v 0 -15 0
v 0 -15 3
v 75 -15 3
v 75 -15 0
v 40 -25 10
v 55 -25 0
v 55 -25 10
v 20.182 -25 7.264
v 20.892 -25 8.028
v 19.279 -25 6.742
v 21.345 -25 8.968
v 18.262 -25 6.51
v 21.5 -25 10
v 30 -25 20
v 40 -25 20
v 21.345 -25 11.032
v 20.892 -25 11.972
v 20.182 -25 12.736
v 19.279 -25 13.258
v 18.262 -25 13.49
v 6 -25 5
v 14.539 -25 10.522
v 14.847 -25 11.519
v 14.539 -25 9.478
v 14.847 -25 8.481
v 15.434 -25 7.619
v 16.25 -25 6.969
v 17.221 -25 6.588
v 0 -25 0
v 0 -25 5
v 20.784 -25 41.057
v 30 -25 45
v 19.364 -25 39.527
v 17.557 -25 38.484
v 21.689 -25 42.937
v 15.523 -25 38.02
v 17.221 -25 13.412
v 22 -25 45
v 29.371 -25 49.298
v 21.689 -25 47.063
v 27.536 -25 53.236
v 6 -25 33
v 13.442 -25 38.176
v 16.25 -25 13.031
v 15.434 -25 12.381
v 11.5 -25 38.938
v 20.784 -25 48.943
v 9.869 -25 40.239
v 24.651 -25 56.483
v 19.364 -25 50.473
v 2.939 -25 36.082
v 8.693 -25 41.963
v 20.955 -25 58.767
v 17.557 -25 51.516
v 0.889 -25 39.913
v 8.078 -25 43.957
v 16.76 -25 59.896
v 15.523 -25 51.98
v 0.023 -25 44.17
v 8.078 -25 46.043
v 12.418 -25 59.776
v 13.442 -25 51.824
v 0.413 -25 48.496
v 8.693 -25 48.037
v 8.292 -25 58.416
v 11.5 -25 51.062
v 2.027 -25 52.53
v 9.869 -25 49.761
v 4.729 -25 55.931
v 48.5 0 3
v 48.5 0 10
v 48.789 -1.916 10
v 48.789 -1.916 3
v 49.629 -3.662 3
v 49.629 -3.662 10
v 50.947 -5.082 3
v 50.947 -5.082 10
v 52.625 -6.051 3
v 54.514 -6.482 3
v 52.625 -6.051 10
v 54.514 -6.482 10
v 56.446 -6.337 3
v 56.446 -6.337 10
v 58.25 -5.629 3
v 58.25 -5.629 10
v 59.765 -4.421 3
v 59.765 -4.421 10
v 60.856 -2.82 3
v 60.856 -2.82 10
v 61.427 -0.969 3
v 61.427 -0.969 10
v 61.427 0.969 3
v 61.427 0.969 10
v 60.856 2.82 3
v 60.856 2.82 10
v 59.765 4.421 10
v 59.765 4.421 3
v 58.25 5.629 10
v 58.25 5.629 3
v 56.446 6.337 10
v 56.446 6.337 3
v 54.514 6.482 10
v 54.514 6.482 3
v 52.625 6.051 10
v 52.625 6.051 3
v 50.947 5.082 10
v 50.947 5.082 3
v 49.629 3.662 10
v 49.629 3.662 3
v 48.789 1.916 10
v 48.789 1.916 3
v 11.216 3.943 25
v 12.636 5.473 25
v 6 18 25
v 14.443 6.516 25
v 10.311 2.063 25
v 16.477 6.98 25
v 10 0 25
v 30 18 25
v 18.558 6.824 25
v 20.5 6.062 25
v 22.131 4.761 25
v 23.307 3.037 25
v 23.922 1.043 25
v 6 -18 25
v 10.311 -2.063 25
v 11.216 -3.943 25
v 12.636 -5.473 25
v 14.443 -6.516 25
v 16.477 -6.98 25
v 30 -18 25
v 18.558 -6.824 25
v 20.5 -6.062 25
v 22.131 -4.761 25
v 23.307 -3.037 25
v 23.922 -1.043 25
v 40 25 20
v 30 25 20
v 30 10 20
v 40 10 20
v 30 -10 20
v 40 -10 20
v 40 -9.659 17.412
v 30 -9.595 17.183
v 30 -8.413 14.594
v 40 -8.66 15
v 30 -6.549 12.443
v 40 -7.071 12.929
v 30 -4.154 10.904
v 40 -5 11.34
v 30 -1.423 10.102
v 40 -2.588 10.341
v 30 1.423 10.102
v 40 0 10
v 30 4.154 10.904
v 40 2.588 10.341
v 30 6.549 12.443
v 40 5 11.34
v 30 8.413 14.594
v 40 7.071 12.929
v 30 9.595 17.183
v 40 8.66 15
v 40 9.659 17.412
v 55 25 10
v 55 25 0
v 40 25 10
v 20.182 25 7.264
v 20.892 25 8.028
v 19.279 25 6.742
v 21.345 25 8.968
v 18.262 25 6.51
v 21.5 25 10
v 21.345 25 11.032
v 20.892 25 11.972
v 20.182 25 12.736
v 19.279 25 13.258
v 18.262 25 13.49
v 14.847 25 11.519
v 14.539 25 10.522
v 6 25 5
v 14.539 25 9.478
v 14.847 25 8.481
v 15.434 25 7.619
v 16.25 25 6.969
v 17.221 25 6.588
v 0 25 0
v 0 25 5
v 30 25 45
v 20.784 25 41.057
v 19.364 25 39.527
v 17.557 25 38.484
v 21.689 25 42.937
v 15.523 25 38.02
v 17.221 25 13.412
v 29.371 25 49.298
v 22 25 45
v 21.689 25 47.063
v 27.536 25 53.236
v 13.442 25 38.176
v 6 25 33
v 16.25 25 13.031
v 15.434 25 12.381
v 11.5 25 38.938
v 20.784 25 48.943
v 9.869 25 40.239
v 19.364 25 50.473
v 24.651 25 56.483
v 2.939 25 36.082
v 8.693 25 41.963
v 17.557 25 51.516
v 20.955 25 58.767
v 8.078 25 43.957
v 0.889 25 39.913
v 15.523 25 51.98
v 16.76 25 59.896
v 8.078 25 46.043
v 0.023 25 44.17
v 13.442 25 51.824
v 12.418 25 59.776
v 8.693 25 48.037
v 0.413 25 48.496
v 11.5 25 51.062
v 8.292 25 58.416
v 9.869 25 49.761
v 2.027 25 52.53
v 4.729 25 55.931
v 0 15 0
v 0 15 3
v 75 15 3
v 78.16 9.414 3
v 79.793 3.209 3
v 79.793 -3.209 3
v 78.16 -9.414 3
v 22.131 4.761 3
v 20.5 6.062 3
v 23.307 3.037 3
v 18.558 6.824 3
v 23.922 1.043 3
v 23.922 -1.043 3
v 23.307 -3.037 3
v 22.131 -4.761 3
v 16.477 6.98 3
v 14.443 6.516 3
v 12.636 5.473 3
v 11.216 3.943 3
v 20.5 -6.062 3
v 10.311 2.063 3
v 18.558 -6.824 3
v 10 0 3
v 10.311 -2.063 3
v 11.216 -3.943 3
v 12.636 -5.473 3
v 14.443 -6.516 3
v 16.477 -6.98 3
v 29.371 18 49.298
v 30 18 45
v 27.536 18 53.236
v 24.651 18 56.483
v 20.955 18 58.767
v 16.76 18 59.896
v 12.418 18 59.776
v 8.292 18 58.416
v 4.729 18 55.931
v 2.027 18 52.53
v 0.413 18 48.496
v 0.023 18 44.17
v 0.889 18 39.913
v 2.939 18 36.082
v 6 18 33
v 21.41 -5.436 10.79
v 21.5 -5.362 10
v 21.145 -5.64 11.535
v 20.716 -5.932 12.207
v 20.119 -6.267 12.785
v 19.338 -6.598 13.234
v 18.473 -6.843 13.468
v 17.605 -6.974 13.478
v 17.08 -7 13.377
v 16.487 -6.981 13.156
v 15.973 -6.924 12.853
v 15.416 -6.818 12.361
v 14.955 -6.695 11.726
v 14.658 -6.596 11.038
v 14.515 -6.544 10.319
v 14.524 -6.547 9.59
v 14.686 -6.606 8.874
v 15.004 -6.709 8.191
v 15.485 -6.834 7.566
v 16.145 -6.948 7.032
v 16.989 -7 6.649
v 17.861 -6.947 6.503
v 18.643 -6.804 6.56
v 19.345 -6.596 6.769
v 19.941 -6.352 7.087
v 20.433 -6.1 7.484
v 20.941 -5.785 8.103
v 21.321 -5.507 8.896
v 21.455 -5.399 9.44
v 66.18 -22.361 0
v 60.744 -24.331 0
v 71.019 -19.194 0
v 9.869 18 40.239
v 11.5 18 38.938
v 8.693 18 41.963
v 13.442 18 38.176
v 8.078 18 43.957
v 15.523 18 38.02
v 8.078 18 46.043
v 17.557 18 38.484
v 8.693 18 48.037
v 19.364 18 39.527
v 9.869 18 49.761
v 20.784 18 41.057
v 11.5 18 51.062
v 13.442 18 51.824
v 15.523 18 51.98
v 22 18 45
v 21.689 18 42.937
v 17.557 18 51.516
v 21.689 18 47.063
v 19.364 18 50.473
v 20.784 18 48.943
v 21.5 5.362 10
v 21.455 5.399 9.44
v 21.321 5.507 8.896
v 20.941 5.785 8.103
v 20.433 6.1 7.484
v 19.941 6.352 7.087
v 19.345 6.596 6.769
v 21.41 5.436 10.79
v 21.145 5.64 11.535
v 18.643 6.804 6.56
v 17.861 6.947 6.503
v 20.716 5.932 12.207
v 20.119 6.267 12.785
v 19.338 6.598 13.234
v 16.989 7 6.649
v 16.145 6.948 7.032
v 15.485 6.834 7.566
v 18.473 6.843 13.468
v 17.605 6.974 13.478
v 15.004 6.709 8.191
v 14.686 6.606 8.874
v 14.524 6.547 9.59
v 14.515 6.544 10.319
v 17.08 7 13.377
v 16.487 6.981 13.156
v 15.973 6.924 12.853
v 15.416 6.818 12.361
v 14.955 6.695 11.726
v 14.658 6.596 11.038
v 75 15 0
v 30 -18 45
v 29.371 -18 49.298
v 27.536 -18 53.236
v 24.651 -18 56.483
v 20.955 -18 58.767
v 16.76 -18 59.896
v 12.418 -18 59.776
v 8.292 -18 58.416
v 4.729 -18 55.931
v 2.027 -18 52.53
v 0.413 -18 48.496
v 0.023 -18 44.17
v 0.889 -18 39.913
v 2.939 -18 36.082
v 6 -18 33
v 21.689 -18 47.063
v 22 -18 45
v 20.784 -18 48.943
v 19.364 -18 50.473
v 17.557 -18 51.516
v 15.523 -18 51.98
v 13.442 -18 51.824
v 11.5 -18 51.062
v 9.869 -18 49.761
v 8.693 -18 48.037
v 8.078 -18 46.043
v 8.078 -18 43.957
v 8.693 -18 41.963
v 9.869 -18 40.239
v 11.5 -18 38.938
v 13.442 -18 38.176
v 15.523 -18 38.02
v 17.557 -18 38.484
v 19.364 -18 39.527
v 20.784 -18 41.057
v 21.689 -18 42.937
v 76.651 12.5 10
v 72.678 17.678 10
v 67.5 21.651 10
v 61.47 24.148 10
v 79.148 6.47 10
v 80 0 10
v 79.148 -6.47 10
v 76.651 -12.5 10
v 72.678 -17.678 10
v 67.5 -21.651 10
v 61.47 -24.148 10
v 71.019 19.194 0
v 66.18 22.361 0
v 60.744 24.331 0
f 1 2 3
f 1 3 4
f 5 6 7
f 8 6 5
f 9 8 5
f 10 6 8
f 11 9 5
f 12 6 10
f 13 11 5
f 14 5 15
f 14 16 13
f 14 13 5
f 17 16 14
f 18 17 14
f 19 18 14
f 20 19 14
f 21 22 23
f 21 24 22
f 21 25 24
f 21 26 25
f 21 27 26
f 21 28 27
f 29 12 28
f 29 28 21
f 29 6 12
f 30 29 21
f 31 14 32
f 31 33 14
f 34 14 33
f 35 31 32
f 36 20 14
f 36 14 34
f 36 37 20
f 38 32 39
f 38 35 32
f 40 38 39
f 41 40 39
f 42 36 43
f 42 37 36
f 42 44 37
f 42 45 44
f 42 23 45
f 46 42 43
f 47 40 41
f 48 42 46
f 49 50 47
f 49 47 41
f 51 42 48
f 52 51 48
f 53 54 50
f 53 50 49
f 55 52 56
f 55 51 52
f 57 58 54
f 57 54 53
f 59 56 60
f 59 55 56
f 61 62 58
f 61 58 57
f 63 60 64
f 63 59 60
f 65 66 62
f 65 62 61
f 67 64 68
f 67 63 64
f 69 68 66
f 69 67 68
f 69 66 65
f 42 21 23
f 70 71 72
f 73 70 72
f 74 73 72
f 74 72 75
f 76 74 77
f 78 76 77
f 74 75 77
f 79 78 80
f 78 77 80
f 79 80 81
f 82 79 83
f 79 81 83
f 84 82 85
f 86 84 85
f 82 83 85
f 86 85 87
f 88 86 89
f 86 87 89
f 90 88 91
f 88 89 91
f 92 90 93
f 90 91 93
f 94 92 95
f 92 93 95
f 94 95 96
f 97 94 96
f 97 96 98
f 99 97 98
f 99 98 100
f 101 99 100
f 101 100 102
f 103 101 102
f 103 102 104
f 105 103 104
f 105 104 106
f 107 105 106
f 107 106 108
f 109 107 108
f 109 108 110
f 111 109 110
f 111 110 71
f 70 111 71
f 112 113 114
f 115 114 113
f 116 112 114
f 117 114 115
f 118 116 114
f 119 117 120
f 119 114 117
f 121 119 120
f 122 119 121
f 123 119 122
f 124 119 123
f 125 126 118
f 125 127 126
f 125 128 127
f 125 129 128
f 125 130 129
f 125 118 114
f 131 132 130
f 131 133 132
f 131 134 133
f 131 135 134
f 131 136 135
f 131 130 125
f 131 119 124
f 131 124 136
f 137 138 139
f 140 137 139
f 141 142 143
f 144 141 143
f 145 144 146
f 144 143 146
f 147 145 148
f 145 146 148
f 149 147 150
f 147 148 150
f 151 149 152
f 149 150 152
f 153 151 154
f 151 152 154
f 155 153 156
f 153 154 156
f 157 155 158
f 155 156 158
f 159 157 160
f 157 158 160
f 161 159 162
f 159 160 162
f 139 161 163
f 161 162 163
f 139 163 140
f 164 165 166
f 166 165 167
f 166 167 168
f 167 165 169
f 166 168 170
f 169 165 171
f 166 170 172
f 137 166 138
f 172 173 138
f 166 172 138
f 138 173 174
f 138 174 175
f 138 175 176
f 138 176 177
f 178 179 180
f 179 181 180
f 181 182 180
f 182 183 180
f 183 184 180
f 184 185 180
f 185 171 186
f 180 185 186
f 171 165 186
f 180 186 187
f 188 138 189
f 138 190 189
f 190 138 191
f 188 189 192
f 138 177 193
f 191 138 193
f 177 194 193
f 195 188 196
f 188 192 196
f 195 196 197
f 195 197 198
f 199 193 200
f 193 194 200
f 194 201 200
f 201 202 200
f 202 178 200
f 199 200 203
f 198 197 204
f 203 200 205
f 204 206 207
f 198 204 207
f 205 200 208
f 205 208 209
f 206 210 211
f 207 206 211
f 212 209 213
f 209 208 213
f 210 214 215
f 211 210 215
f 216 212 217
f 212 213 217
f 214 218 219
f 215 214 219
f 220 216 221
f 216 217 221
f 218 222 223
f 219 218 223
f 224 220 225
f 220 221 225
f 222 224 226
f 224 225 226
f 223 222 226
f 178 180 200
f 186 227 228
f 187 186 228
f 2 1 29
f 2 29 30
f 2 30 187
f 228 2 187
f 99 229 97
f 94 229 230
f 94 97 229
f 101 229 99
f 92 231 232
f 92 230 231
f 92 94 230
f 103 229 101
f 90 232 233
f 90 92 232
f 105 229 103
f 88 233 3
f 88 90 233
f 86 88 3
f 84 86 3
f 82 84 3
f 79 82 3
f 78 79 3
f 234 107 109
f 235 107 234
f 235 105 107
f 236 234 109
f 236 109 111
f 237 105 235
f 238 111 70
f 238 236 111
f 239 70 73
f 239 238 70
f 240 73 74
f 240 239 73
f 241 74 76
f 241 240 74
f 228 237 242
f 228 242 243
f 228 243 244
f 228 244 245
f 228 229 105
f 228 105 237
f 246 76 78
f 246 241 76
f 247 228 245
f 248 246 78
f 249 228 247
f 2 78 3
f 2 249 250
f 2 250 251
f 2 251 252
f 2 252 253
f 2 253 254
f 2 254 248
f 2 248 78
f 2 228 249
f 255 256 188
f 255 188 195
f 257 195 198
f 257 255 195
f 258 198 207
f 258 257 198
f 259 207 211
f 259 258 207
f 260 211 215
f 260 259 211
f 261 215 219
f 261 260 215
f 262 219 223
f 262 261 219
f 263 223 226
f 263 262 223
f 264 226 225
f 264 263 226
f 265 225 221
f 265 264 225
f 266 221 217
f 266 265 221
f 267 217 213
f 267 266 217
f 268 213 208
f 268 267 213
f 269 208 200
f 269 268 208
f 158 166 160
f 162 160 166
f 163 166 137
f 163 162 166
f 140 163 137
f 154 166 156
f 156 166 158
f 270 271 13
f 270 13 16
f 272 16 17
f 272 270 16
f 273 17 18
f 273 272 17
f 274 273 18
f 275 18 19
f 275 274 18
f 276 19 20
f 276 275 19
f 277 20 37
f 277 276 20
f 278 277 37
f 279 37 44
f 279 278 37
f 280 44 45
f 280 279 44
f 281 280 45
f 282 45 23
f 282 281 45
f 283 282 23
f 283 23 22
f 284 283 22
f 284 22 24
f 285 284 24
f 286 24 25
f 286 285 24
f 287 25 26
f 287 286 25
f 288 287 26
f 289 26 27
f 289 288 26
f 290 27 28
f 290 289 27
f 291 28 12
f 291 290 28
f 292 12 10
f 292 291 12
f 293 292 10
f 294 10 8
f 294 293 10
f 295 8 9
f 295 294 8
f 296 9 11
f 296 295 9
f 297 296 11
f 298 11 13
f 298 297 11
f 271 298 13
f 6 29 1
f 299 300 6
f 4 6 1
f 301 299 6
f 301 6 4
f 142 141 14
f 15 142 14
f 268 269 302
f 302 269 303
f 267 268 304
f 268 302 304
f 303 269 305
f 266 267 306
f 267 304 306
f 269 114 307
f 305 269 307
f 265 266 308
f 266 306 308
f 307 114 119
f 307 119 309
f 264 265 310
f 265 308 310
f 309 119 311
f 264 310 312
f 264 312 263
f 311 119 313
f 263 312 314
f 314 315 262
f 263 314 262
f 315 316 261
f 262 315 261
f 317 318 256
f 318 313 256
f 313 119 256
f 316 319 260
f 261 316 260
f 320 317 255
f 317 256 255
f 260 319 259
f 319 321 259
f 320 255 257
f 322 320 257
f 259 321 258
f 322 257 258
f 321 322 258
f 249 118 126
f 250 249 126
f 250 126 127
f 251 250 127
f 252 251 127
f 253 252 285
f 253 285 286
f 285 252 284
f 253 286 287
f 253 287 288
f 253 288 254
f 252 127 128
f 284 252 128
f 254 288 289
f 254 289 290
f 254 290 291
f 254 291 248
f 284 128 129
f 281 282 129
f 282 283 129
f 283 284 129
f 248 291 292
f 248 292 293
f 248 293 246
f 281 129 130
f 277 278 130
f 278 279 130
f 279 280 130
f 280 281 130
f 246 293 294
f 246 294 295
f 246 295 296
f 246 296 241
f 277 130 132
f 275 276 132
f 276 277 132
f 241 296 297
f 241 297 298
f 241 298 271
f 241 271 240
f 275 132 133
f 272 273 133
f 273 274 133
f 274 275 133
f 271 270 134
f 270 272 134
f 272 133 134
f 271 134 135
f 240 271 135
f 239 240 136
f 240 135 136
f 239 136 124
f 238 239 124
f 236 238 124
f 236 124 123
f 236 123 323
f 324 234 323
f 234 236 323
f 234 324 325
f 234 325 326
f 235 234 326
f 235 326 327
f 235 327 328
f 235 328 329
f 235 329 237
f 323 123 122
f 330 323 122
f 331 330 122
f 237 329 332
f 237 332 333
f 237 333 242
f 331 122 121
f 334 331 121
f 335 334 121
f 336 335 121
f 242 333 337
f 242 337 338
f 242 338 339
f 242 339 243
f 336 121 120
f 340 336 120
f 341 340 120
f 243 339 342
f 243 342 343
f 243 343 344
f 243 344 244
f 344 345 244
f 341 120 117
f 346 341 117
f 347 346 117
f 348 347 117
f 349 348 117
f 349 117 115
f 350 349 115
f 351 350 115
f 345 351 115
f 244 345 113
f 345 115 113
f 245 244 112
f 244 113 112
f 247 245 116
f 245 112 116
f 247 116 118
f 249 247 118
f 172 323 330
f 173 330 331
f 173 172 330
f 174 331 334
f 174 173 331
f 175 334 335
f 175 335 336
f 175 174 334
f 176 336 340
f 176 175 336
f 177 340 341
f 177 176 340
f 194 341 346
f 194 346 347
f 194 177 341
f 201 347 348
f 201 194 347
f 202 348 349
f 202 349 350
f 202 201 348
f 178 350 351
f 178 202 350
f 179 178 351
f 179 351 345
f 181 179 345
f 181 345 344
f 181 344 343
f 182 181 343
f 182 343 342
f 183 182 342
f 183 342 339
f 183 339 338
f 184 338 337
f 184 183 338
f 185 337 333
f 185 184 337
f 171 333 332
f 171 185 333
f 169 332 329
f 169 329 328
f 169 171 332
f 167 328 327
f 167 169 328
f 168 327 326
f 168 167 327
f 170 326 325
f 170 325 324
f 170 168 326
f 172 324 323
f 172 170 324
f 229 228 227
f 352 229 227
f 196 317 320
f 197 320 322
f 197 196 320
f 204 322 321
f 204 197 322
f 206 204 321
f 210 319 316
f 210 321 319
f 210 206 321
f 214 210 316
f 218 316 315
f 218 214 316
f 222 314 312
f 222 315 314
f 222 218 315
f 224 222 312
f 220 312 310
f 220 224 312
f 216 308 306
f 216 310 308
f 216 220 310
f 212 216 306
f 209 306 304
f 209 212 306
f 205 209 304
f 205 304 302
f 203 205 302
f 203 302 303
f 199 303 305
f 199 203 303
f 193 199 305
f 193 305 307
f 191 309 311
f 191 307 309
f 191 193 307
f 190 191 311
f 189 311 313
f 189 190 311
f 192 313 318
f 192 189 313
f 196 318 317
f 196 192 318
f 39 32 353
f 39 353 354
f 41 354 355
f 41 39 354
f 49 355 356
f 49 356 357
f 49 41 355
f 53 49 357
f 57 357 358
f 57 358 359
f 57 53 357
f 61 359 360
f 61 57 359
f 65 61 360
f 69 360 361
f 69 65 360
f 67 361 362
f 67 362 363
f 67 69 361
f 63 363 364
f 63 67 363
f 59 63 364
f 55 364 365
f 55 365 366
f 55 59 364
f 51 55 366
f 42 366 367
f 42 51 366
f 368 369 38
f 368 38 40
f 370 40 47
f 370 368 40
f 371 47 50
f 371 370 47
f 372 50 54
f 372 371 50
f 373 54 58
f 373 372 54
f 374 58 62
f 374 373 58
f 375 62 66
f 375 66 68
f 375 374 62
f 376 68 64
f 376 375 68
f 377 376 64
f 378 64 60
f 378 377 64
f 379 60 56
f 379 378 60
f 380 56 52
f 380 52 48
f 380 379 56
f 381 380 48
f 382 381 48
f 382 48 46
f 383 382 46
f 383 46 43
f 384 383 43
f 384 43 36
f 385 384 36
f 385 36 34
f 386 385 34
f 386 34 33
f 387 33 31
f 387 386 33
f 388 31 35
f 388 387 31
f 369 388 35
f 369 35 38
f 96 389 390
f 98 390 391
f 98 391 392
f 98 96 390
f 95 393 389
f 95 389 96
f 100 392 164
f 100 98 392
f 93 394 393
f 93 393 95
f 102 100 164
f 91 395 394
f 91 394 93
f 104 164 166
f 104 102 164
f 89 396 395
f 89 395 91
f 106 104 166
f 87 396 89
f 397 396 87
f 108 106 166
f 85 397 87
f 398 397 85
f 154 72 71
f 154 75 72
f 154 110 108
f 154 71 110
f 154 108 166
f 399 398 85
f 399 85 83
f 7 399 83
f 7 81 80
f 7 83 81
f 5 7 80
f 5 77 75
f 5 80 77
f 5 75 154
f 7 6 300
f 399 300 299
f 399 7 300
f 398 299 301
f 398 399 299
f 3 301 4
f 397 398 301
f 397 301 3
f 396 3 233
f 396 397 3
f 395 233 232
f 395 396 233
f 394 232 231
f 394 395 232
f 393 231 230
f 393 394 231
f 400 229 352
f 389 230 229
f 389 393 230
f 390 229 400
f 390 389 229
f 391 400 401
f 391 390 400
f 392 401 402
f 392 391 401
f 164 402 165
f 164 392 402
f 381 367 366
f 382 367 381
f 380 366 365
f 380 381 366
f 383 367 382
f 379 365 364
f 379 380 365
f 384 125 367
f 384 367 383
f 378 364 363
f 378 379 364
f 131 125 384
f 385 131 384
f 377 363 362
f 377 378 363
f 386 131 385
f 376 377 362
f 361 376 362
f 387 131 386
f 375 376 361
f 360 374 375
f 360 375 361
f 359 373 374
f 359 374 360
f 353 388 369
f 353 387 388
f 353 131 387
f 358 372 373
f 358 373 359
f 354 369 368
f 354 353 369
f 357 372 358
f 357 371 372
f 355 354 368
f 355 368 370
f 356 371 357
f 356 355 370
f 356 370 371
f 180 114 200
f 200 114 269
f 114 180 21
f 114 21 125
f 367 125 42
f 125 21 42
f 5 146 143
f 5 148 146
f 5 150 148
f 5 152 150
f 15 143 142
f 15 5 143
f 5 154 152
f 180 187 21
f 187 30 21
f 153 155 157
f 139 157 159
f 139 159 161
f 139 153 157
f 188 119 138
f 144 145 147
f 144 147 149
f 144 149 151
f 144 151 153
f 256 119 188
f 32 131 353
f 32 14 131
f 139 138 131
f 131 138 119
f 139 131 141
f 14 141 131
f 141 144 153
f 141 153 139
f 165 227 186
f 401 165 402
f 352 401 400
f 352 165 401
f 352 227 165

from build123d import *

# Parameters (mm, degrees)
SKETCH_R        = 7
SKETCH_R_2      = 3.5
PAD_DEPTH       = 25
SKETCH001_R     = 25
PAD001_DEPTH    = 10
SKETCH002_W     = 35
SKETCH002_H     = 36
POCKET_DEPTH    = 30.001
SKETCH003_R     = 7
POCKET001_DEPTH = 25.001
SKETCH004_R     = 6.5
POCKET002_DEPTH = 10.001
SKETCH005_W     = 10
SKETCH005_H     = 50
PAD002_DEPTH    = 10
SKETCH006_R     = 10
POCKET003_DEPTH = 10
SKETCH007_W     = 3
SKETCH007_H     = 30
POCKET004_DEPTH = 80.001


with BuildPart() as part:
    # Sketch → Pad (new body, symmetric)
    with BuildSketch(Plane.XZ):
        with BuildLine():
            Line((0, 0), (0, 5))
            Line((0, 5), (6, 5))
            Line((6, 5), (6, 33))
            ThreePointArc((30, 45), (8.291796, 58.416408), (6, 33))
            Line((30, 10), (30, 45))
            Line((55, 10), (30, 10))
            Line((55, 0), (55, 10))
            Line((0, 0), (55, 0))
        make_face()
        with Locations((15, 45)):
            Circle(SKETCH_R, mode=Mode.SUBTRACT)
        with Locations((18, 10)):
            Circle(SKETCH_R_2, mode=Mode.SUBTRACT)
    extrude(amount=PAD_DEPTH, both=True)

    # Sketch001 (on Face6 of Pad) → Pad001 (join)
    with BuildSketch(Plane(origin=(0, 0, 10), x_dir=(-1, 0, 0), z_dir=(0, 0, 1))):
        with Locations((-55, 0)):
            Circle(SKETCH001_R)
    extrude(amount=-PAD001_DEPTH)

    # Sketch002 (on Face7 of Pad001) → Pocket (cut, through all)
    with BuildSketch(Plane(origin=(30, 0, 0), x_dir=(0, 0, 1), z_dir=(1, 0, 0))):
        with Locations((42.5, 0)):
            Rectangle(SKETCH002_W, SKETCH002_H)
    extrude(amount=-POCKET_DEPTH, mode=Mode.SUBTRACT)

    # Sketch003 (on Face16 of Pocket) → Pocket001 (cut, through all)
    with BuildSketch(Plane(origin=(0, 0, 25), x_dir=(-1, 0, 0), z_dir=(0, 0, 1))):
        with Locations((-17, 0)):
            Circle(SKETCH003_R)
    extrude(amount=-POCKET001_DEPTH, mode=Mode.SUBTRACT)

    # Sketch004 (on Face11 of Pocket001) → Pocket002 (cut, through all)
    with BuildSketch(Plane(origin=(0, 0, 10), x_dir=(-1, 0, 0), z_dir=(0, 0, 1))):
        with Locations((-55, 0)):
            Circle(SKETCH004_R)
    extrude(amount=-POCKET002_DEPTH, mode=Mode.SUBTRACT)

    # Sketch005 (on Face11 of Pocket002) → Pad002 (join)
    with BuildSketch(Plane(origin=(30, 0, 0), x_dir=(0, 0, 1), z_dir=(1, 0, 0))):
        with Locations((15, 0)):
            Rectangle(SKETCH005_W, SKETCH005_H)
    extrude(amount=PAD002_DEPTH)

    # Sketch006 (on Face20 of Pad002) → Pocket003 (cut)
    with BuildSketch(Plane(origin=(40, 0, 0), x_dir=(0, 0, 1), z_dir=(1, 0, 0))):
        with Locations((20, 0)):
            Circle(SKETCH006_R)
    extrude(amount=-POCKET003_DEPTH, mode=Mode.SUBTRACT)

    # Sketch007 (on Face1 of Pocket003) → Pocket004 (cut, through all)
    with BuildSketch(Plane(origin=(0, 0, 0), x_dir=(0, 0, -1), z_dir=(-1, 0, 0))):
        with Locations((-1.5, 0)):
            Rectangle(SKETCH007_W, SKETCH007_H)
    extrude(amount=-POCKET004_DEPTH, mode=Mode.SUBTRACT)


solid = part.part
